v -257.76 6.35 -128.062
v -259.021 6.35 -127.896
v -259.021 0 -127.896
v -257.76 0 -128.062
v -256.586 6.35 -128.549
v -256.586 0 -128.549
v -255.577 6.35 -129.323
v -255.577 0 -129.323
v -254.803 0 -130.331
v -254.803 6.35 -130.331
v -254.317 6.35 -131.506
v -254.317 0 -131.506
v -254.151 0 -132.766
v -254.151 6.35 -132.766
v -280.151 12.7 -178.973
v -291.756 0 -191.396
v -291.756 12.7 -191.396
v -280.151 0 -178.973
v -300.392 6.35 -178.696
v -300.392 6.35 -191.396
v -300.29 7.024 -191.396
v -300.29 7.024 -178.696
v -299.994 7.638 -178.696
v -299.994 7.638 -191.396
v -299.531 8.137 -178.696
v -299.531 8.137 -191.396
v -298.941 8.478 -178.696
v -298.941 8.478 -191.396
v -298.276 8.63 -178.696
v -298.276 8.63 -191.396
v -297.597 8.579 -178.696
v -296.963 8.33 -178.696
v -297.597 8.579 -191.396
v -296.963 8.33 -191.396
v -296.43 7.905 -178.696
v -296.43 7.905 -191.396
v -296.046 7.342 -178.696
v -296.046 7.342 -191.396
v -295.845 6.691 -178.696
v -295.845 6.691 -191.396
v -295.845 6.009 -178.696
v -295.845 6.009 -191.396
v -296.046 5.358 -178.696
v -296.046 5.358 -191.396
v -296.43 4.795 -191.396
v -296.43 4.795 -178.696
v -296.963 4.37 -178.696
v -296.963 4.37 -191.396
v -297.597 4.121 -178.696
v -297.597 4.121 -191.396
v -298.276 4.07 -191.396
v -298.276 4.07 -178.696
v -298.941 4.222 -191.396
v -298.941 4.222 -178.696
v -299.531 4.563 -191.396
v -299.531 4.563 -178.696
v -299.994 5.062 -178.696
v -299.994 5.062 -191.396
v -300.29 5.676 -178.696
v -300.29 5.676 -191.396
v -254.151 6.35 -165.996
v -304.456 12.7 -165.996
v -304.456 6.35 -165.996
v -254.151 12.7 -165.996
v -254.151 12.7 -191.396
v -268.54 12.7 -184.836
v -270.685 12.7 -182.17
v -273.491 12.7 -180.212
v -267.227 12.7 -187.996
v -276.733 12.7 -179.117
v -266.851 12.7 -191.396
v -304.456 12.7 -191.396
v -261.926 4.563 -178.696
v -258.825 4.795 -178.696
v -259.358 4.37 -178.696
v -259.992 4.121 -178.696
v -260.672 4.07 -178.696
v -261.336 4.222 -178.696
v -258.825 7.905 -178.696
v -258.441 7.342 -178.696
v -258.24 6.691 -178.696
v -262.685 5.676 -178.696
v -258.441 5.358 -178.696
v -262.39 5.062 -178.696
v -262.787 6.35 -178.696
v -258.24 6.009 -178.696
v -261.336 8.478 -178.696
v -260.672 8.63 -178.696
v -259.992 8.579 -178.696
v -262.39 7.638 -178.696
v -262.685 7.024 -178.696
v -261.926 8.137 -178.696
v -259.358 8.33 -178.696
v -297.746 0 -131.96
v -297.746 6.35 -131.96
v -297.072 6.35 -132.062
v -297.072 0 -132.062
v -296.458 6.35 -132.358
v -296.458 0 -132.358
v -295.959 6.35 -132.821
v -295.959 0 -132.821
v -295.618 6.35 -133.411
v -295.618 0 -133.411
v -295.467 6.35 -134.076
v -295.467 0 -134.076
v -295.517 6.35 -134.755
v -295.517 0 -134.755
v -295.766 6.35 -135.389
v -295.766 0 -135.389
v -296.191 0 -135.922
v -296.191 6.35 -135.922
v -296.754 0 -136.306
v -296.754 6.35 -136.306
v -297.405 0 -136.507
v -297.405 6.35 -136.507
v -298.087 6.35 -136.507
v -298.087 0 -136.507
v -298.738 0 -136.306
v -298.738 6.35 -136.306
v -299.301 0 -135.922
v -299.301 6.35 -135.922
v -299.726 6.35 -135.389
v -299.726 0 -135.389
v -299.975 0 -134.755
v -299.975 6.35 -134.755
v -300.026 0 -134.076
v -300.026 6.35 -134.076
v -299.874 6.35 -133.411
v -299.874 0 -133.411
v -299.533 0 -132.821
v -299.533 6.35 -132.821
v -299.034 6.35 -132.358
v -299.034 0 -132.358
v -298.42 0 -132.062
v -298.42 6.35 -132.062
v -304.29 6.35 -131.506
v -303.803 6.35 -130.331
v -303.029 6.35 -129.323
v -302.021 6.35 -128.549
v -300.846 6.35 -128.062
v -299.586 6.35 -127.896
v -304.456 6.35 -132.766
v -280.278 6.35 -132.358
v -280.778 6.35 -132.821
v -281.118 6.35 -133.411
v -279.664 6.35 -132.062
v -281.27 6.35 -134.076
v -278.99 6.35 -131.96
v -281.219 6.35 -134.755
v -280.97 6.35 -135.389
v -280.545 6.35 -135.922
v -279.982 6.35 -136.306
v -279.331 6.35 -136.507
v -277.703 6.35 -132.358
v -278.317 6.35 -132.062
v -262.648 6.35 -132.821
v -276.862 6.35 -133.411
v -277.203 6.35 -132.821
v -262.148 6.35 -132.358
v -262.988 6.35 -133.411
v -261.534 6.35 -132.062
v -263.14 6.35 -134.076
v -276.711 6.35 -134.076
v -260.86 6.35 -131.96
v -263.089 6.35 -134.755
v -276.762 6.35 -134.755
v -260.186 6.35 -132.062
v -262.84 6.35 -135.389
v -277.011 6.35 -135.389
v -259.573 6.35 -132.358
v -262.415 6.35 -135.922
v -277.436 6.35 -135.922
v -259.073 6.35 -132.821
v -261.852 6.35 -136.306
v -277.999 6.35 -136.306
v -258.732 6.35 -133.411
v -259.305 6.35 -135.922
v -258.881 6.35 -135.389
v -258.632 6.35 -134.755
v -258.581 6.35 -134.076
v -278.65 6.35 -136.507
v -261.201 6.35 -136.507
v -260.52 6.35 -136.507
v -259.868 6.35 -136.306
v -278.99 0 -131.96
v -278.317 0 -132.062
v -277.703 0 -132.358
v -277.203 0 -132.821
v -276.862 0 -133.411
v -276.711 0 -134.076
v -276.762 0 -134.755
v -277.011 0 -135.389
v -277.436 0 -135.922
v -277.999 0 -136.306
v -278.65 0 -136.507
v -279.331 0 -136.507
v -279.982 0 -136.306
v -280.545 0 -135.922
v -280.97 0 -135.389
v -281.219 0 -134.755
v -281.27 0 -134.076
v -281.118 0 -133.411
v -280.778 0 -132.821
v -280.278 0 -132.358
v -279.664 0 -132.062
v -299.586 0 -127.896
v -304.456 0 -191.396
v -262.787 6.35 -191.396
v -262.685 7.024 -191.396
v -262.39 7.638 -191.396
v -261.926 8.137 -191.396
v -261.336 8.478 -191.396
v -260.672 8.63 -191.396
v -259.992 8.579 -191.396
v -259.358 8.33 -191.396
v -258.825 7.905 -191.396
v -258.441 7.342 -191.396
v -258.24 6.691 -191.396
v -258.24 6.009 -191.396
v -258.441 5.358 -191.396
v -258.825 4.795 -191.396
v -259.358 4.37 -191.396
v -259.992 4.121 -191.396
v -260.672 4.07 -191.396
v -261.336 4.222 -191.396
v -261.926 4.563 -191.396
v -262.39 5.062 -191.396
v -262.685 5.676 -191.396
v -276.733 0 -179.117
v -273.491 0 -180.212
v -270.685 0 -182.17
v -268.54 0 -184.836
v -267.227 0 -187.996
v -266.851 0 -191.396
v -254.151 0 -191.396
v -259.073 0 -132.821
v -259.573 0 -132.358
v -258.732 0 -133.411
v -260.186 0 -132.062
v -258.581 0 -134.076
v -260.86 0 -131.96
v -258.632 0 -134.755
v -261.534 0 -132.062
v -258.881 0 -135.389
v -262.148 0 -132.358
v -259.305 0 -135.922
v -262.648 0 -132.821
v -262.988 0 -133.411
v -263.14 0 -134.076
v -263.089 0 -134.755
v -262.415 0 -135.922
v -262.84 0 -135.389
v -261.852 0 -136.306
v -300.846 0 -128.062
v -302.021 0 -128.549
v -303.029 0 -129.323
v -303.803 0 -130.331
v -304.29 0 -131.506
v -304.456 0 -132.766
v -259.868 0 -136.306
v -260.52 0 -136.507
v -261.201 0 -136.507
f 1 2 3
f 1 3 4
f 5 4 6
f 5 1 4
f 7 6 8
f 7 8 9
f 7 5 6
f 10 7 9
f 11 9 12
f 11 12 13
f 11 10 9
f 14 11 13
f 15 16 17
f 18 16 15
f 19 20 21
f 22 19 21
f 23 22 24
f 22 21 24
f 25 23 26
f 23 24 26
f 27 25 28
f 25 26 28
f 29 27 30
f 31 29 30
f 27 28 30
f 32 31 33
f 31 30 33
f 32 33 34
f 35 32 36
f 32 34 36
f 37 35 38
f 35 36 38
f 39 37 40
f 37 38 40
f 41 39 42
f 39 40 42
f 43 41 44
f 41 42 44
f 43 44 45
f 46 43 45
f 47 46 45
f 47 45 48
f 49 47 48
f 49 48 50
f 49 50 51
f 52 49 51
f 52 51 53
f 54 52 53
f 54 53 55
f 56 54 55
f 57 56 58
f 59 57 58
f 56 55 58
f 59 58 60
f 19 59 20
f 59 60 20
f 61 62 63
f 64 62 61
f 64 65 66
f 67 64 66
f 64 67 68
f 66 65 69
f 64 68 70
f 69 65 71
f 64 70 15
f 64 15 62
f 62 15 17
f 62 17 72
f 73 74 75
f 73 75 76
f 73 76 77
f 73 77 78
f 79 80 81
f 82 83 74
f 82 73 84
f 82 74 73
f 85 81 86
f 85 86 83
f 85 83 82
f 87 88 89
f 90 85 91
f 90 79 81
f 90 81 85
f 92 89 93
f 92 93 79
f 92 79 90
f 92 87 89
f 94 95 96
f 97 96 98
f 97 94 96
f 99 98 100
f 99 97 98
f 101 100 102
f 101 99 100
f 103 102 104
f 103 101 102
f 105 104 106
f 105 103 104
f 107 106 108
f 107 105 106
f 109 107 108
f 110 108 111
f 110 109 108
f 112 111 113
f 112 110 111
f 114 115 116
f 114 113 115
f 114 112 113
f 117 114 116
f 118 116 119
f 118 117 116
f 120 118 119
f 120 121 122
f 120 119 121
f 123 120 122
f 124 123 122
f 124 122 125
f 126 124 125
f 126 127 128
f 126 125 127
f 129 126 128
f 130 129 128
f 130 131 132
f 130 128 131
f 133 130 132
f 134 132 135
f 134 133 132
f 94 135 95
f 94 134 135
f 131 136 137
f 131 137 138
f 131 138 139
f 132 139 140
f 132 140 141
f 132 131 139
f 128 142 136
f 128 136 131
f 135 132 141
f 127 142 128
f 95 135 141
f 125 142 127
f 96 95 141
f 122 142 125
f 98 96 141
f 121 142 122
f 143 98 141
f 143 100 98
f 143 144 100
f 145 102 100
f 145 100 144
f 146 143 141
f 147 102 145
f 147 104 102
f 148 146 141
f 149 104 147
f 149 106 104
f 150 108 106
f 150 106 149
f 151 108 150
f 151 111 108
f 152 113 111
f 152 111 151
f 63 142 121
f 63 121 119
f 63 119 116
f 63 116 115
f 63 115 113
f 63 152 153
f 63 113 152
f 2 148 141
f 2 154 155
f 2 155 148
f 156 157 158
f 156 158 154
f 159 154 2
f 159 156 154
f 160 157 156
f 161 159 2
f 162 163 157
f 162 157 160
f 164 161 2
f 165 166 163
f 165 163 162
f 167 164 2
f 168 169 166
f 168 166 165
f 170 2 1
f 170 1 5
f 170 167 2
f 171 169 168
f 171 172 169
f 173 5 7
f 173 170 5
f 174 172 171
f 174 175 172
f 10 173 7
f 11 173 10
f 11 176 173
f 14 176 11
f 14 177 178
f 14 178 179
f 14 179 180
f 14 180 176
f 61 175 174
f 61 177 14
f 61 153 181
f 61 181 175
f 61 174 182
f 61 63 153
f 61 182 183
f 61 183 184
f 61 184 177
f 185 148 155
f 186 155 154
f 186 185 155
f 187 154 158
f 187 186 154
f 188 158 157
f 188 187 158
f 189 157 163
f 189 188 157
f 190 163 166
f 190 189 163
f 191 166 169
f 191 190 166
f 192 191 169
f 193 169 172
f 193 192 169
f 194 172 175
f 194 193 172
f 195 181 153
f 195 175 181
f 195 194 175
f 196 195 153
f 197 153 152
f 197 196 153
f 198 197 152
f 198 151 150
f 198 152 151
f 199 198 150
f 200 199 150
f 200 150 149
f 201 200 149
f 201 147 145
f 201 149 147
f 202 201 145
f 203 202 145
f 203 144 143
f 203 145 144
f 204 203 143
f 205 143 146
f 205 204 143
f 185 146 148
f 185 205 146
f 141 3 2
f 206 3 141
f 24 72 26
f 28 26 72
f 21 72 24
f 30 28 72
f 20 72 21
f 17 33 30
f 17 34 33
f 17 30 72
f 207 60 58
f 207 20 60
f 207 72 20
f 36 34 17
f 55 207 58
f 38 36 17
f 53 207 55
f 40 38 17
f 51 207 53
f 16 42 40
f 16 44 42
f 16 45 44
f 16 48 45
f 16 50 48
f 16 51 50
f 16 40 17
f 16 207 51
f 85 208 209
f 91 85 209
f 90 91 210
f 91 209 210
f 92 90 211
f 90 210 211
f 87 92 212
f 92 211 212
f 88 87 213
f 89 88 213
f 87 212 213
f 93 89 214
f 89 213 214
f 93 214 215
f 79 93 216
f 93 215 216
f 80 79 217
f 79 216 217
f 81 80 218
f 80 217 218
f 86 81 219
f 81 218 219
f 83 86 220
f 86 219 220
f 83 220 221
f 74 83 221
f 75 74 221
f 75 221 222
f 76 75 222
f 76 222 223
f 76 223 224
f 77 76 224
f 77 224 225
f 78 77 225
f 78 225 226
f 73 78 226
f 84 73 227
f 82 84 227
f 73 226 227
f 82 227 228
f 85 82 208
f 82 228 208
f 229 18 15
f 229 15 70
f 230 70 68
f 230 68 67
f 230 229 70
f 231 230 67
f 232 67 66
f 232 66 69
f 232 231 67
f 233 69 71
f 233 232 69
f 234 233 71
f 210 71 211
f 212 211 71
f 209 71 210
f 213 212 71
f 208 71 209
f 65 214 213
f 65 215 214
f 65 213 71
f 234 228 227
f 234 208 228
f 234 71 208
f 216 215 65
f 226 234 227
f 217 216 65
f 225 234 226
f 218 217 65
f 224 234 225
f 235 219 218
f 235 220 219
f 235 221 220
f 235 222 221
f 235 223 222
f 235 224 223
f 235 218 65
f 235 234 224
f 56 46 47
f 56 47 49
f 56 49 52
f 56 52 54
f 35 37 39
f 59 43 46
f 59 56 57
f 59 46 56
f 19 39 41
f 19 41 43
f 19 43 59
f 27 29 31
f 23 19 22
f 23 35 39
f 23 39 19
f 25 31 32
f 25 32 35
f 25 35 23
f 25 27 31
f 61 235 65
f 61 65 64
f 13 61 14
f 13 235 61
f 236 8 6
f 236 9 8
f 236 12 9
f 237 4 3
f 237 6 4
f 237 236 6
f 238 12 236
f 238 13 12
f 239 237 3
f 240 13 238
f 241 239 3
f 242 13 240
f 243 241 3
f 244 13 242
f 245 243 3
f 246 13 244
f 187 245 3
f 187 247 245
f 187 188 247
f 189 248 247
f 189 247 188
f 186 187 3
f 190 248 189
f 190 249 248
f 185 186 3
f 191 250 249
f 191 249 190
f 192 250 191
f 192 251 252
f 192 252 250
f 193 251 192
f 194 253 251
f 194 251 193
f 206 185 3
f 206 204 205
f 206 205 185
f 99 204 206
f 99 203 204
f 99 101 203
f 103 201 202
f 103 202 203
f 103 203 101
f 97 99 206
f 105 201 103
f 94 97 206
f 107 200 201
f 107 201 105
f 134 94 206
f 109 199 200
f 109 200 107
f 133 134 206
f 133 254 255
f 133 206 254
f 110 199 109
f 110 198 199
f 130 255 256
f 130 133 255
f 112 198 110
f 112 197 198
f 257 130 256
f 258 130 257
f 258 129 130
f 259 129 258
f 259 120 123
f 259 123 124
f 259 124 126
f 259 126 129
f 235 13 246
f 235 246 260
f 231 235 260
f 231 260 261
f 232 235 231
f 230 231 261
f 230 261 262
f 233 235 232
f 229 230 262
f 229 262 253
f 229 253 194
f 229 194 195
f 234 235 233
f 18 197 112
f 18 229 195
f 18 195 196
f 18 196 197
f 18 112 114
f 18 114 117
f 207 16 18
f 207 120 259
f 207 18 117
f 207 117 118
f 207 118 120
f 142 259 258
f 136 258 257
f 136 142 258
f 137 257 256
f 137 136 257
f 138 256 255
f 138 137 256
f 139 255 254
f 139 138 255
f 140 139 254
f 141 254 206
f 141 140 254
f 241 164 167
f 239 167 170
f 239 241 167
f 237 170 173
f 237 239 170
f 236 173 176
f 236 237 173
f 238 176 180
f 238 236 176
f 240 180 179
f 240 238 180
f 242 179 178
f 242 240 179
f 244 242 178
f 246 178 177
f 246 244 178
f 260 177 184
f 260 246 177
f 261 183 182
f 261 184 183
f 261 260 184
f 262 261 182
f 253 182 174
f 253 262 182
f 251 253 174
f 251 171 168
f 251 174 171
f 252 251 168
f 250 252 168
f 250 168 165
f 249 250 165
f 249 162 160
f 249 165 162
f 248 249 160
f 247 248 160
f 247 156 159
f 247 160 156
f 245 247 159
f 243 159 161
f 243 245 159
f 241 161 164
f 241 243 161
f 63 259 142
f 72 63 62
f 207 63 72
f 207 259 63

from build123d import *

# Parameters (mm, degrees)
SKETCH1_R           = 2.286
BOSS_EXTRUDE1_DEPTH = 12.7
SKETCH5_R           = 2.286
CUT_EXTRUDE3_DEPTH  = 12.7
FILLET1_R           = 4.87
FILLET2_R           = 4.87
SKETCH7_W           = 50.304618045
SKETCH7_H           = 38.1
CUT_EXTRUDE4_DEPTH  = 6.35


with BuildPart() as part:
    # Sketch1 → Boss-Extrude1 (new body)
    with BuildSketch(Plane(origin=(0, 0, 0), x_dir=(1, 0, 0), z_dir=(0, 1, 0))):
        with BuildLine():
            Line((-291.755501553, 191.396492393), (-280.151228022, 178.973093671))
            ThreePointArc((-280.151228022, 178.973093671), (-270.685286175, 182.170263236), (-266.850883508, 191.396492393))
            Line((-266.850883508, 191.396492393), (-254.150883508, 191.396492393))
            Line((-254.150883508, 191.396492393), (-254.150883508, 127.896492393))
            Line((-254.150883508, 127.896492393), (-304.455501553, 127.896492393))
            Line((-304.455501553, 127.896492393), (-304.455501553, 191.396492393))
            Line((-304.455501553, 191.396492393), (-291.755501553, 191.396492393))
        make_face()
        with Locations(Location((-297.746130931, 134.246492393, 0), (0, 0, 270))):
            Circle(SKETCH1_R, mode=Mode.SUBTRACT)
        with Locations(Location((-278.990383135, 134.246492393, 0), (0, 0, 270))):
            Circle(SKETCH1_R, mode=Mode.SUBTRACT)
        with Locations(Location((-260.86025413, 134.246492393, 0), (0, 0, 270))):
            Circle(SKETCH1_R, mode=Mode.SUBTRACT)
    extrude(amount=BOSS_EXTRUDE1_DEPTH)

    # Sketch5 → Cut-Extrude3 (cut)
    with BuildSketch(Plane(origin=(0, 0, -191.396492393), x_dir=(-1, 0, 0), z_dir=(0, 0, -1))):
        with Locations((260.500883508, 6.35)):
            Circle(SKETCH5_R)
        with Locations((298.105501553, 6.35)):
            Circle(SKETCH5_R)
    extrude(amount=-CUT_EXTRUDE3_DEPTH, mode=Mode.SUBTRACT)

    # Fillet1
    fillet1_edges = [part.edges().sort_by_distance(p)[0] for p in [
        (-304.455501553, 6.35, -127.896492393),
    ]]
    fillet(fillet1_edges, radius=FILLET1_R)

    # Fillet2
    fillet2_edges = [part.edges().sort_by_distance(p)[0] for p in [
        (-254.150883508, 6.35, -127.896492393),
    ]]
    fillet(fillet2_edges, radius=FILLET2_R)

    # Sketch7 → Cut-Extrude4 (cut)
    with BuildSketch(Plane(origin=(0, 12.7, 0), x_dir=(1, 0, 0), z_dir=(0, 1, 0))):
        with Locations((-279.303192531, 146.946492393)):
            Rectangle(SKETCH7_W, SKETCH7_H)
    extrude(amount=-CUT_EXTRUDE4_DEPTH, mode=Mode.SUBTRACT)


solid = part.part
